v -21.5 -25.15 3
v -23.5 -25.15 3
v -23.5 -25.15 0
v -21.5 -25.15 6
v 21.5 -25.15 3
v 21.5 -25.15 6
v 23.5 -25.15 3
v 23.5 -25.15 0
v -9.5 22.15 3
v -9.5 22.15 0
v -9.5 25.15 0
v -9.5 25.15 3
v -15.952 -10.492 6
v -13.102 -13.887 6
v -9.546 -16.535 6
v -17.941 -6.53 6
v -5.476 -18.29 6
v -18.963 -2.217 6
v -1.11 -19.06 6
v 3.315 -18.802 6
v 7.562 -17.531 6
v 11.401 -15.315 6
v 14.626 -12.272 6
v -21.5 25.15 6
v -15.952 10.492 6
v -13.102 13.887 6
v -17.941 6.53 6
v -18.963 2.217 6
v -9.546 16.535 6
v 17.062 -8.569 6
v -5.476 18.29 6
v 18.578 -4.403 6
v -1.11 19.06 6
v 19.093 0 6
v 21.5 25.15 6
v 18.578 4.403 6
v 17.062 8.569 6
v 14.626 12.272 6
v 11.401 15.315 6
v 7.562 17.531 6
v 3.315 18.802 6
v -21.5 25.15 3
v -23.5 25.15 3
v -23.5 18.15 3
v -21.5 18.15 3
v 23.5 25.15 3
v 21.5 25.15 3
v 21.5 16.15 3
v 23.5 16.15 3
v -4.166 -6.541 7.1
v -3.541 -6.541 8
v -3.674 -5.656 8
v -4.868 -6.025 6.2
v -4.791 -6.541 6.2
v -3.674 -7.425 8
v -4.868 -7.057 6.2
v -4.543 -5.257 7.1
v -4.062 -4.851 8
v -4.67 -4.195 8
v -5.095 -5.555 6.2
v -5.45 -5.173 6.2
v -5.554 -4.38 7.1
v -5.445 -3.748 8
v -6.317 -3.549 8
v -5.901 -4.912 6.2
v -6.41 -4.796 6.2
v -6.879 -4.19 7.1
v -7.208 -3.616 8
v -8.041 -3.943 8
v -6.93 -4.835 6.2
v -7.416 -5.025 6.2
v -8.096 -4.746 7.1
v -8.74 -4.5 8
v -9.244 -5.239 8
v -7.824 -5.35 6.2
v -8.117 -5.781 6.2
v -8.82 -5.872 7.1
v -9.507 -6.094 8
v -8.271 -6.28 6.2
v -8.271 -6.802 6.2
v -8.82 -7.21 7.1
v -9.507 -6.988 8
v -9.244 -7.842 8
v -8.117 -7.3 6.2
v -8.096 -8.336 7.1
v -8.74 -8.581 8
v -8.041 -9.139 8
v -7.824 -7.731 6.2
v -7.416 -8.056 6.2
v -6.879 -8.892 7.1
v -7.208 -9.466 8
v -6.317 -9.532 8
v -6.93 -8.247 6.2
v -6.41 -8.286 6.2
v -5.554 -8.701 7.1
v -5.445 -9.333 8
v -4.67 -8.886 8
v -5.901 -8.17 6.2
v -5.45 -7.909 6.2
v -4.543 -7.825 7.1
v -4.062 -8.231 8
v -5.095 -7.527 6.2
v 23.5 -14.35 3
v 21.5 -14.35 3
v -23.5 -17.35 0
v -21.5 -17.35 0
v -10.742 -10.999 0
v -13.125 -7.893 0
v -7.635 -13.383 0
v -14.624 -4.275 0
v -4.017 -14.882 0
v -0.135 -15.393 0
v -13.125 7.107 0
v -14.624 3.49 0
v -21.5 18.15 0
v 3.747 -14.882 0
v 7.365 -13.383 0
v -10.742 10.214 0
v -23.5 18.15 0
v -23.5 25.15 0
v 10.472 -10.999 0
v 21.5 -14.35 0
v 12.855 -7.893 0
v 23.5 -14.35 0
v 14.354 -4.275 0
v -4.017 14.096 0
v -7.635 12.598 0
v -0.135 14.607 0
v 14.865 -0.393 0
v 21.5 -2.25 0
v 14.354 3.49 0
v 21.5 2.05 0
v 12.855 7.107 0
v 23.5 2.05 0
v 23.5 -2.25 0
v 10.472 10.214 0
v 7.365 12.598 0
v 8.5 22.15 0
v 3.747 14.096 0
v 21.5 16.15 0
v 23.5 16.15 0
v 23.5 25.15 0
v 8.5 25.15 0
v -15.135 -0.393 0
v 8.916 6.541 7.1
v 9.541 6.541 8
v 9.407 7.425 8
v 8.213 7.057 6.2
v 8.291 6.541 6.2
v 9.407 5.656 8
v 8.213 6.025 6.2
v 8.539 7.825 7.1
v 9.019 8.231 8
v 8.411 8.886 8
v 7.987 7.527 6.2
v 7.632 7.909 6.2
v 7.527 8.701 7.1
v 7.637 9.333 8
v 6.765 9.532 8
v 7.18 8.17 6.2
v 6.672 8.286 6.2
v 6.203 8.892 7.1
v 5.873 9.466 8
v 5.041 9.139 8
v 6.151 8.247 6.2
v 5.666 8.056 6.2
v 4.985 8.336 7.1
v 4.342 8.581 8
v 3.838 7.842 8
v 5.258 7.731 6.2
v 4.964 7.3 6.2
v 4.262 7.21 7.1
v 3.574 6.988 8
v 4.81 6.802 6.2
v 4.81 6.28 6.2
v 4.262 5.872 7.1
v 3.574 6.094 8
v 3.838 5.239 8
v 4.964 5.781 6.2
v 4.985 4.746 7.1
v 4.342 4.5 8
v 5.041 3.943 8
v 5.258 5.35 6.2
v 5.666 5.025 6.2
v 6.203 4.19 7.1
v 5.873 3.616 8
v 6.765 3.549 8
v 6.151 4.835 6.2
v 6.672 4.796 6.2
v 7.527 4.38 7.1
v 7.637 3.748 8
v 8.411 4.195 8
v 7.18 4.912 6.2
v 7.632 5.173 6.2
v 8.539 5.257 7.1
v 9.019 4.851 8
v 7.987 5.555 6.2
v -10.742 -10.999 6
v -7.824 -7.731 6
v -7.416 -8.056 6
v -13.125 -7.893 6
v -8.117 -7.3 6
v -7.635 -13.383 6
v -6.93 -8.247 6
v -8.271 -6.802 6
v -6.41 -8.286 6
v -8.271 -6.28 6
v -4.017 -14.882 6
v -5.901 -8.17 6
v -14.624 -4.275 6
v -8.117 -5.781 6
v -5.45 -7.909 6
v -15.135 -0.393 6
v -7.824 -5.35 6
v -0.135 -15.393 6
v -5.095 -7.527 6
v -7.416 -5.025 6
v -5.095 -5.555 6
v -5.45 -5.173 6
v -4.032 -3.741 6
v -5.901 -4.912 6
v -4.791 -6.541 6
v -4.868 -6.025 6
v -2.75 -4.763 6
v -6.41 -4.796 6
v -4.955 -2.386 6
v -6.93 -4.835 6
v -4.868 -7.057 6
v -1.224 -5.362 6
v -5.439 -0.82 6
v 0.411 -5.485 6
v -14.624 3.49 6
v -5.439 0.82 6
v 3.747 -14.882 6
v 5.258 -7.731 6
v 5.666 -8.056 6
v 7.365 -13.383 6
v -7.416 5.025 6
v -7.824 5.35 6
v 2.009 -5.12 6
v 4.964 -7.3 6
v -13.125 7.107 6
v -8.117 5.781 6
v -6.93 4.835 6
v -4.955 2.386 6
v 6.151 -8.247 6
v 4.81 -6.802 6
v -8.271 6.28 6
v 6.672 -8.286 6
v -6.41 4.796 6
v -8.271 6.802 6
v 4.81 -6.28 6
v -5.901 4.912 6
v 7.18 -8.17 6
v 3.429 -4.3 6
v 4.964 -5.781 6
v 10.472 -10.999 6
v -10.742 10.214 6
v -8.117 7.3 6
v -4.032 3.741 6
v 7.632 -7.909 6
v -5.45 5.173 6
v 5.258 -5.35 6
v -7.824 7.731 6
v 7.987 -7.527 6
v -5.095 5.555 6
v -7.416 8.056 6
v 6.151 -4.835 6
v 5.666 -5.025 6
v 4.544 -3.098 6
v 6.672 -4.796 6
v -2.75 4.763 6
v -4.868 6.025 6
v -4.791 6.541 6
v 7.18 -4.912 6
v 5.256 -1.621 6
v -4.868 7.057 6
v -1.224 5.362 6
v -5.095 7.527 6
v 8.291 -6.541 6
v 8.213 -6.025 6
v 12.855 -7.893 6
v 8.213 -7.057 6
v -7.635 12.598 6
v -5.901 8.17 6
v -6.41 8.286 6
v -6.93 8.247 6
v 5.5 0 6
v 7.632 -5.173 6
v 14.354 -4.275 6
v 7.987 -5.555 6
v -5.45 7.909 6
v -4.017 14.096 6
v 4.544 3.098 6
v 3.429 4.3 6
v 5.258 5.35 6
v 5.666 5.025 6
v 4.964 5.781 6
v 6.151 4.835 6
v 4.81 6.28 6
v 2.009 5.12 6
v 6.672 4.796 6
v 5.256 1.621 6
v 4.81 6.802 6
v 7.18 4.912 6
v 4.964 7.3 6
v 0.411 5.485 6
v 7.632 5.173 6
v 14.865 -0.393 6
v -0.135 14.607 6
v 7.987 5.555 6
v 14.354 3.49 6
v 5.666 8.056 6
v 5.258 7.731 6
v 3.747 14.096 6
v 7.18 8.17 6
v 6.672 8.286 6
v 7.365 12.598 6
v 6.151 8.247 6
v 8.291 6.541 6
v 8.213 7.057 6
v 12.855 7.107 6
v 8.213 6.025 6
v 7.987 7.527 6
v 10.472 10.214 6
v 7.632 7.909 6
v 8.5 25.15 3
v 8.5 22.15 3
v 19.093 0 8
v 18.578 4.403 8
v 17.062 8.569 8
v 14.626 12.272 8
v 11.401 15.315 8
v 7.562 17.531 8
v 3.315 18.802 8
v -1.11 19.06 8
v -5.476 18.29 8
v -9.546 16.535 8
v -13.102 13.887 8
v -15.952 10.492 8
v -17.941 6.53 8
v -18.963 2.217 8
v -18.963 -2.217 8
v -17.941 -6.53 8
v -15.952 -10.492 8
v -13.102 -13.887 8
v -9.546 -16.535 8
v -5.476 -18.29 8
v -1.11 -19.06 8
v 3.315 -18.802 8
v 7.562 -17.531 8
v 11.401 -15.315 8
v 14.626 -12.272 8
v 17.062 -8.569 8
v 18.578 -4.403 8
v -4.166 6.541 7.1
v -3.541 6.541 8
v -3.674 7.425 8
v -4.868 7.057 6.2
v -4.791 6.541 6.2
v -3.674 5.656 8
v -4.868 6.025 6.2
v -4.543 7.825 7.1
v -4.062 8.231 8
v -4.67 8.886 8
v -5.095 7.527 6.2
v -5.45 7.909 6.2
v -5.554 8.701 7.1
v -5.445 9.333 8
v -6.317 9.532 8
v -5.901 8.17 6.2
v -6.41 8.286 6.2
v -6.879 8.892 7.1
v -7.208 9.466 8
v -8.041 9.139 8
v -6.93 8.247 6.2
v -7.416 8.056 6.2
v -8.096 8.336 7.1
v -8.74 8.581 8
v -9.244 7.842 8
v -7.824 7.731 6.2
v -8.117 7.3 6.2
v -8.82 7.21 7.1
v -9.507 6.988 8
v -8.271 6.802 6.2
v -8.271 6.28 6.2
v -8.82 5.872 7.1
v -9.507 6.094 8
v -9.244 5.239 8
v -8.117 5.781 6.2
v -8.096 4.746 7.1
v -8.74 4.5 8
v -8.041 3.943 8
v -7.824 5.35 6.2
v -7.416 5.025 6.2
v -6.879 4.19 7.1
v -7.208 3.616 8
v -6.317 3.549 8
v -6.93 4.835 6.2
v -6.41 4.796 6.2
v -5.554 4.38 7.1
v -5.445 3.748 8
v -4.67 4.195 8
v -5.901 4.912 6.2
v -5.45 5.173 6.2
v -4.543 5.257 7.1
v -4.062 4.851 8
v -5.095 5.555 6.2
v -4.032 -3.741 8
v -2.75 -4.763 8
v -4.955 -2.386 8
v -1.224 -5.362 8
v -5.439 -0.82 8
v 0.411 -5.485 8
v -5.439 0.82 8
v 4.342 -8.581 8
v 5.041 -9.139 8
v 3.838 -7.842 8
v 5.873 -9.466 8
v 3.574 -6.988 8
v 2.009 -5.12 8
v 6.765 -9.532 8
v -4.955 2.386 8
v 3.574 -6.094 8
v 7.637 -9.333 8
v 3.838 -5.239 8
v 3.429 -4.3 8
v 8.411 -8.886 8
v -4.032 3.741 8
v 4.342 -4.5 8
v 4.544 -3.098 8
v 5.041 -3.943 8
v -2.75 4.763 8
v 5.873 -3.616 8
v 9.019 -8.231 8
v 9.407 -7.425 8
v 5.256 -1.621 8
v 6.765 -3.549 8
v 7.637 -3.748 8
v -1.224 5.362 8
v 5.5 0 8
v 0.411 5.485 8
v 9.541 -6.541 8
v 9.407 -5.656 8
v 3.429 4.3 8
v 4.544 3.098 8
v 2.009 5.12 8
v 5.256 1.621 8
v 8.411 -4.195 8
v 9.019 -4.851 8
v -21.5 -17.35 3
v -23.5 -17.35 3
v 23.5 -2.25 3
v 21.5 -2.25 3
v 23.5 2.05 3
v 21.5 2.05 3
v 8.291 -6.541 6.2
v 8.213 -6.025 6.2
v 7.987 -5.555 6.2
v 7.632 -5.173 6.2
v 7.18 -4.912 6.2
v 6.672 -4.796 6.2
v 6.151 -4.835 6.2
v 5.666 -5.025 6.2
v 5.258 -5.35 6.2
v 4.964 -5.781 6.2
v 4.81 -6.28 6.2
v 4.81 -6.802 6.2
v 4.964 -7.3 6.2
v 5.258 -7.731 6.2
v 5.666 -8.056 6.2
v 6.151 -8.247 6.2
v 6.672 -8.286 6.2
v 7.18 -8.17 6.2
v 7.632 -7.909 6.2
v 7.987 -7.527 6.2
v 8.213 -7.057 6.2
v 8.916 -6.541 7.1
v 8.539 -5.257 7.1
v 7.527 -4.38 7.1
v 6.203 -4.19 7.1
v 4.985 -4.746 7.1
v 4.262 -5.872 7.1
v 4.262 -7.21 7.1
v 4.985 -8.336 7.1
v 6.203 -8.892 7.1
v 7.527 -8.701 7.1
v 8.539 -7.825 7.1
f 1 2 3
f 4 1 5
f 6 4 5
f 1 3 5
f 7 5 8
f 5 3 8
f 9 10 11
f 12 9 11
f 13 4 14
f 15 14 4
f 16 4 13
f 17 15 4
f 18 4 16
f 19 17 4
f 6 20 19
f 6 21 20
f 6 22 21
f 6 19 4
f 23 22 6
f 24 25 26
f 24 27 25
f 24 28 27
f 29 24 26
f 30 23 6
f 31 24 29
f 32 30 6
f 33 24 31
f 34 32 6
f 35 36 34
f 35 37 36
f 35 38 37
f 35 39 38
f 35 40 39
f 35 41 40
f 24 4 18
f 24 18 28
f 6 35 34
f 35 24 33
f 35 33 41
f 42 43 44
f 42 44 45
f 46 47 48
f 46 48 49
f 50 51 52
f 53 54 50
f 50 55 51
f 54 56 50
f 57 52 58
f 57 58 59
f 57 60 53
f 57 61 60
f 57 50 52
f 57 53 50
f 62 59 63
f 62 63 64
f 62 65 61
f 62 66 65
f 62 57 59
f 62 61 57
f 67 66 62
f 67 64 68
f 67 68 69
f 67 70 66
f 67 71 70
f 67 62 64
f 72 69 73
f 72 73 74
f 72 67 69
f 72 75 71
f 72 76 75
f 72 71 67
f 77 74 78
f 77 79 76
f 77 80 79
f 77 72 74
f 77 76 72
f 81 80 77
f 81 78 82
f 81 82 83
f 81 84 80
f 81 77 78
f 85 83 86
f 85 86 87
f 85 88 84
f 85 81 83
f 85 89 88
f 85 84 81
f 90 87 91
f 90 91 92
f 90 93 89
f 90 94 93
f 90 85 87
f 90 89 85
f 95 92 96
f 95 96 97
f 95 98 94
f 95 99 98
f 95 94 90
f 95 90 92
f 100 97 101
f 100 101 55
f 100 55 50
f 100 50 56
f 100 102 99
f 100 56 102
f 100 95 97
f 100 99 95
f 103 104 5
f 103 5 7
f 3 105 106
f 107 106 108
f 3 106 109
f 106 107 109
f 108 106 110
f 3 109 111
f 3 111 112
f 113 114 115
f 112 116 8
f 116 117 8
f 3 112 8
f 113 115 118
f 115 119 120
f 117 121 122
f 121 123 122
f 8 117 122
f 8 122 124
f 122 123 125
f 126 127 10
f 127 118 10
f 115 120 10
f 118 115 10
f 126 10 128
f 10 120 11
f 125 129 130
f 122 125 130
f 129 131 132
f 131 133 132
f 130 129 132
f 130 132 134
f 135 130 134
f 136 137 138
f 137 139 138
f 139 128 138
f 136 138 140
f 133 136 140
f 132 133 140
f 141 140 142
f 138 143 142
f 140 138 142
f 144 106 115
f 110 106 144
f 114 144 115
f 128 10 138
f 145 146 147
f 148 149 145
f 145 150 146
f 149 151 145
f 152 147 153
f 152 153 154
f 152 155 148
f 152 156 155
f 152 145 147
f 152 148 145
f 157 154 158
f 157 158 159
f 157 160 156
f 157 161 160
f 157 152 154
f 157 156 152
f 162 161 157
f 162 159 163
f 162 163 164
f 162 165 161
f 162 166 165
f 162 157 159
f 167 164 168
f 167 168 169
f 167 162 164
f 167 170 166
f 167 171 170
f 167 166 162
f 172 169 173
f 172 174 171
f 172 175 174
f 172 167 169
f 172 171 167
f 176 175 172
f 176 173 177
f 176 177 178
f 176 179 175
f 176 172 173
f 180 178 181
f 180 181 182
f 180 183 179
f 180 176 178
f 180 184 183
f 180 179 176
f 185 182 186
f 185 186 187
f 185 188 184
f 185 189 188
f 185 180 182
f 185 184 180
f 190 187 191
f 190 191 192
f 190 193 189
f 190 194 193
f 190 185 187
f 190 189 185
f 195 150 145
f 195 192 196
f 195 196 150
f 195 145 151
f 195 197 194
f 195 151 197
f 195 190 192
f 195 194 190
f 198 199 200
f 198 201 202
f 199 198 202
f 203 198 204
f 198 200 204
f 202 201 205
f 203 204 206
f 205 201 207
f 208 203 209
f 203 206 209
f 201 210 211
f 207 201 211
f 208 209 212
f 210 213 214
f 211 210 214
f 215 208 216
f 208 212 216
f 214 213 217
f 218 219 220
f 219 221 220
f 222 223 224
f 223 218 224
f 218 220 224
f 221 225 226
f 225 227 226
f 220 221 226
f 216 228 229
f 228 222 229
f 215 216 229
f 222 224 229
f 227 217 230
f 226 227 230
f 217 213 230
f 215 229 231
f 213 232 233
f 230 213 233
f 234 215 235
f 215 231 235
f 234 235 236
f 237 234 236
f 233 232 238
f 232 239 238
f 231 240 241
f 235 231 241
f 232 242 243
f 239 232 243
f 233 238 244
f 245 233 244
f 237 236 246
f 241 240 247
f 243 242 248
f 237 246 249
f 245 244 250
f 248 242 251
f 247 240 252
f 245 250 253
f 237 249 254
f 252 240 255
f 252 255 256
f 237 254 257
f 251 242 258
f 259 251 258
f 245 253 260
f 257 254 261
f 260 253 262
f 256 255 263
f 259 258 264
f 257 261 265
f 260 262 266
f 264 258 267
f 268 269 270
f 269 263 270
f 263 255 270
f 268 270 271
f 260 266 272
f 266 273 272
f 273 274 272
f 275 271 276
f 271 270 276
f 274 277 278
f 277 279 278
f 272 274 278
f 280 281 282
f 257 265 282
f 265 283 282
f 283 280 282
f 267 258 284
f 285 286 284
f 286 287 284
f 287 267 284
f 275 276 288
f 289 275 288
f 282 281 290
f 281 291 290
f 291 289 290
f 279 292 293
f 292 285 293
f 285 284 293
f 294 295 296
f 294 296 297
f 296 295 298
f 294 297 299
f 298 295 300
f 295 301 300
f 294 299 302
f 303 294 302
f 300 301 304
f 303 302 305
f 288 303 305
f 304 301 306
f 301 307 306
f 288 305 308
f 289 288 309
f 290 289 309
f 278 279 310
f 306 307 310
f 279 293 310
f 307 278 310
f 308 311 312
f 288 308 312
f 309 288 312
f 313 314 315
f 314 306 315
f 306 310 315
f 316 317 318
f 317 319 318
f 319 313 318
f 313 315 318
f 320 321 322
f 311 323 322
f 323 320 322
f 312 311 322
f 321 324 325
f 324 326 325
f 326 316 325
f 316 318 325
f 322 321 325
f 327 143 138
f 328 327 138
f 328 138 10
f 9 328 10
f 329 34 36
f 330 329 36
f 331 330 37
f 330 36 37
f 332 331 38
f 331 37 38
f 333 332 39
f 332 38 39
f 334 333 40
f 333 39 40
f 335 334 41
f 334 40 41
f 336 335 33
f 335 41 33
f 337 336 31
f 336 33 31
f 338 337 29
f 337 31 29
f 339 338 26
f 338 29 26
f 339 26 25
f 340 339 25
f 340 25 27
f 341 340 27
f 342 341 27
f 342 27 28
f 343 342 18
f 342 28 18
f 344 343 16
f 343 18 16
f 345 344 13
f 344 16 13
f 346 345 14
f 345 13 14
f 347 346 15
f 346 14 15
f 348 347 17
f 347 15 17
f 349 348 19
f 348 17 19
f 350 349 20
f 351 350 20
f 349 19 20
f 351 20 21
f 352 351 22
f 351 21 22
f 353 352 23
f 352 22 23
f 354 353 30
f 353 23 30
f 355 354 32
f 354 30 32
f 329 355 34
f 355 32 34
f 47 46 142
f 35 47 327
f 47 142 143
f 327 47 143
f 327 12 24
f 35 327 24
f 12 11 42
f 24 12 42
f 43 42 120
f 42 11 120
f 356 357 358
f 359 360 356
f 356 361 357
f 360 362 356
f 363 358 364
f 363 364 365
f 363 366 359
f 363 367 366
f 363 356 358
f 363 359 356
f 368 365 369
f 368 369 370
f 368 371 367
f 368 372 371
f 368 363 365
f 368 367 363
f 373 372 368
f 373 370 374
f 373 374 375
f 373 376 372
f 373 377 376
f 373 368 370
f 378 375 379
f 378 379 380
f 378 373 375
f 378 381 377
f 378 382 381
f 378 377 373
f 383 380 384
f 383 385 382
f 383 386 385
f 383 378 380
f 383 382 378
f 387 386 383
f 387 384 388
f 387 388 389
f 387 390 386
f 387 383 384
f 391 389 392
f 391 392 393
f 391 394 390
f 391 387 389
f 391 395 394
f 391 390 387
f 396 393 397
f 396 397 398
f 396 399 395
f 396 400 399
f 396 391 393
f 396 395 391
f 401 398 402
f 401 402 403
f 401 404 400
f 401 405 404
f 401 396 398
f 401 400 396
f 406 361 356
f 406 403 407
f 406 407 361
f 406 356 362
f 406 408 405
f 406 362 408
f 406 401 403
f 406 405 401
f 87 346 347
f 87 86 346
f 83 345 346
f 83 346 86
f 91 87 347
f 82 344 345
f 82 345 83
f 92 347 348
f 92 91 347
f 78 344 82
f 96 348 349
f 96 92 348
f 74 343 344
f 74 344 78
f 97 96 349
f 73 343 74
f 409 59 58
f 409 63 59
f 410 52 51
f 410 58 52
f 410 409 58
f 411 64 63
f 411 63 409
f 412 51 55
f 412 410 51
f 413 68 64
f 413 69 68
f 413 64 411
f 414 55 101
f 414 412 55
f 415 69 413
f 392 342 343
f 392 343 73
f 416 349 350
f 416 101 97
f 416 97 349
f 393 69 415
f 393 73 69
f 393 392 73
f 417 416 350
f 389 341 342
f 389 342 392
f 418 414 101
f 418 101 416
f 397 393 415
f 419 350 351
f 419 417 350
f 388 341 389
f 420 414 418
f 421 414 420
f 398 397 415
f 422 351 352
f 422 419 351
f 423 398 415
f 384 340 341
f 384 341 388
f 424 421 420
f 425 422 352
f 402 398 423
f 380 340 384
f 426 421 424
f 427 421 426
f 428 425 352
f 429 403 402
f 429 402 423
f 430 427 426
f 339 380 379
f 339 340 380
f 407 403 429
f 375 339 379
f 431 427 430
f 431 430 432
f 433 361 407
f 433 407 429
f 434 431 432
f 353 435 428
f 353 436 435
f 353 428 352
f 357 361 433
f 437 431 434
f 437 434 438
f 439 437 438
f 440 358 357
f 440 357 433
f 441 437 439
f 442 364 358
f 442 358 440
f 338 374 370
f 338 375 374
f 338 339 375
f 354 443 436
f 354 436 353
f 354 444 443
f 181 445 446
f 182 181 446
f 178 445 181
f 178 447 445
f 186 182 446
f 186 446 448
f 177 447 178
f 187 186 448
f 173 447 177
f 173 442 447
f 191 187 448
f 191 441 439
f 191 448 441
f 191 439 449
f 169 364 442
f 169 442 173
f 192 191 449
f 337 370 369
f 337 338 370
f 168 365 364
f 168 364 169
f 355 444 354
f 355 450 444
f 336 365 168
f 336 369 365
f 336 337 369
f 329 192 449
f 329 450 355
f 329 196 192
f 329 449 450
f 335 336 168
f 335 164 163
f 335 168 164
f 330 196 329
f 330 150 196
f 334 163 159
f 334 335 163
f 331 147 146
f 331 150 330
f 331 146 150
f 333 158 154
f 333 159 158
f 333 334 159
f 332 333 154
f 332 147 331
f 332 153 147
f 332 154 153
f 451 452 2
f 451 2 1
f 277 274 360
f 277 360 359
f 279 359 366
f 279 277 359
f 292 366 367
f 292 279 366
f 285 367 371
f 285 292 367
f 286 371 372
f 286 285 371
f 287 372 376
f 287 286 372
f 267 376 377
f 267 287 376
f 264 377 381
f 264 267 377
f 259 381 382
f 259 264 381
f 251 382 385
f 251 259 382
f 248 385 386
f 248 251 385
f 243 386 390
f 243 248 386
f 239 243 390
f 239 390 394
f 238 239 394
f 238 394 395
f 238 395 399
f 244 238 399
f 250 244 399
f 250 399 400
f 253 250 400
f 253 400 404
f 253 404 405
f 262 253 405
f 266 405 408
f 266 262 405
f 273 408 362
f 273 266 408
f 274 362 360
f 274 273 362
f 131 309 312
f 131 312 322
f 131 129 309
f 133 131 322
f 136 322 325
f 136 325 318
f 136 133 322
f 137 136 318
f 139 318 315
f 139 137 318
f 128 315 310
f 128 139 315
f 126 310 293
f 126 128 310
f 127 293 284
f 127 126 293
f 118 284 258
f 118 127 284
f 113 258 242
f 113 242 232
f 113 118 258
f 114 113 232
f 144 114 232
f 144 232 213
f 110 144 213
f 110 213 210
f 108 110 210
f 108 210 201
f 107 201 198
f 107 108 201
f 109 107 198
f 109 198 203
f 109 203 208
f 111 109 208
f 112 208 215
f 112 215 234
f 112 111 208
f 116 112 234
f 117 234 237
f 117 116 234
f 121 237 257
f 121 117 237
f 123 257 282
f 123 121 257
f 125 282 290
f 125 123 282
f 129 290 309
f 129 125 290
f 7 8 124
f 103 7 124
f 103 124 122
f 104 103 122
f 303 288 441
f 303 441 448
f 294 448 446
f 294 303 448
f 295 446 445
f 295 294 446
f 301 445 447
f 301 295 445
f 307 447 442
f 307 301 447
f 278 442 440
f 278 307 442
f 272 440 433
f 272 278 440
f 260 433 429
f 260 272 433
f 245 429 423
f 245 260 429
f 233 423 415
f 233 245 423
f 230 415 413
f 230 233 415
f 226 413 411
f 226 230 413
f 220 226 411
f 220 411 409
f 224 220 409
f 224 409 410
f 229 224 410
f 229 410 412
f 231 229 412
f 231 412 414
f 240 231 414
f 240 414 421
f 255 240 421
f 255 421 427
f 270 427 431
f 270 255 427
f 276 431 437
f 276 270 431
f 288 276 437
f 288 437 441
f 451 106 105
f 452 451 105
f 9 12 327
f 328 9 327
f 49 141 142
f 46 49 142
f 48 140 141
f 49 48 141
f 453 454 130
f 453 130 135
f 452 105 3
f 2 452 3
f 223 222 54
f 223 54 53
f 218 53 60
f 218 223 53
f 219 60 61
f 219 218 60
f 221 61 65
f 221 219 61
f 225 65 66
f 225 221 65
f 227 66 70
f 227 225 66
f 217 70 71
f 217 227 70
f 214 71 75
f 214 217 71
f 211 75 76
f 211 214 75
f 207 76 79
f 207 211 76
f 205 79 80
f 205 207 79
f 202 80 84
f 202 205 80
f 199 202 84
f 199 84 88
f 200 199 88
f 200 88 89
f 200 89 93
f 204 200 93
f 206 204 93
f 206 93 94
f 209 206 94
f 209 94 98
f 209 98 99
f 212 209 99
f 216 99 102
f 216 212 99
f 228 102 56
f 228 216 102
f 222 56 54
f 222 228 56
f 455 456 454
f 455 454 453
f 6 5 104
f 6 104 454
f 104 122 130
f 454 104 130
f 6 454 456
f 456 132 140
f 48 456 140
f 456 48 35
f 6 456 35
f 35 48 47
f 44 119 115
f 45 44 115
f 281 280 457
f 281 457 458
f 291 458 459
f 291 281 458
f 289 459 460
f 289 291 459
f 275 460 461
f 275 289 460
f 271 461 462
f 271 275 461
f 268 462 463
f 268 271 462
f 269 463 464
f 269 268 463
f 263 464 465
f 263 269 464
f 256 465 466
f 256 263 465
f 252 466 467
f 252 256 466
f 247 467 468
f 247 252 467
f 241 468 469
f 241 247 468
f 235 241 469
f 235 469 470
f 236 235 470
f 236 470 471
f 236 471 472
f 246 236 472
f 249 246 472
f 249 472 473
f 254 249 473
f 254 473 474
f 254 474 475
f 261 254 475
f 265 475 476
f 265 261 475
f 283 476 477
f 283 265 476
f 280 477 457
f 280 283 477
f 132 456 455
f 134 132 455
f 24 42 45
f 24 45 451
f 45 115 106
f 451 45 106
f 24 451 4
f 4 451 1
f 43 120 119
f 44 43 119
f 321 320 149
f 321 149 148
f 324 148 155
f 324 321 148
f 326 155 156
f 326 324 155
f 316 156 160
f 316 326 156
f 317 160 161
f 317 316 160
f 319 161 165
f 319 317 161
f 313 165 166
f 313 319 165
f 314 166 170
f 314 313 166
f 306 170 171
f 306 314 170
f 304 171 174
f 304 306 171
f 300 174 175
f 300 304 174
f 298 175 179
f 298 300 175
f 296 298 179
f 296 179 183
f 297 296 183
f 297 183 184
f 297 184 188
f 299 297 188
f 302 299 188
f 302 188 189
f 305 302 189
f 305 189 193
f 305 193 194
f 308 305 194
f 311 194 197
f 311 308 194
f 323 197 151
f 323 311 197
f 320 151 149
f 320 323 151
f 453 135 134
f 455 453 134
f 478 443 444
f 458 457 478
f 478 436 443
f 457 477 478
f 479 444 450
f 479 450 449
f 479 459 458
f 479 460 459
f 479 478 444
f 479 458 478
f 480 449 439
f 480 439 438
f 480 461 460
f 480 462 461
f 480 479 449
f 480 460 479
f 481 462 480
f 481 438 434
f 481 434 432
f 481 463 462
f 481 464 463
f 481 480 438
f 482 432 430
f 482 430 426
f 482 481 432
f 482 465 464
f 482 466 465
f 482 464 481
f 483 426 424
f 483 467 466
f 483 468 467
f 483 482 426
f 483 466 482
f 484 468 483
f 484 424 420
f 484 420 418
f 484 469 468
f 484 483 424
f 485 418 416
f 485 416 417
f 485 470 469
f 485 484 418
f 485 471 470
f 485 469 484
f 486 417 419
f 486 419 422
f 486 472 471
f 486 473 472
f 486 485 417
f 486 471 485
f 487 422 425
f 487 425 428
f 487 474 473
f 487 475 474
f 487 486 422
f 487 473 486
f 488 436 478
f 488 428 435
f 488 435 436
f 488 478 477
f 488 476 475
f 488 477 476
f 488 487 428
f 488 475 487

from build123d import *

# Parameters (mm, degrees)
F0_R     = 15
F1_DEPTH = 3
F2_R     = 15
F2_W     = 18
F2_H     = 3
F3_DEPTH = 3
F4_R     = 19.092503
F4_R_2   = 1.75
F4_R_3   = 5.5
F5_DEPTH = 2
F6_SIZE2 = 1.8
F6_SIZE  = 1.25
F7_W     = 2
F7_H     = 0.1
F8_DEPTH = 3.001


with BuildPart() as f1:
    # F0 (on Top) → F1 (new body)
    with BuildSketch(Plane.XY):
        Polygon((-9.5, 25.15), (-23.5, 25.15), (-23.5, 18.15), (-21.5, 18.15), (-21.5, -17.35), (-23.5, -17.35), (-23.5, -25.15), (23.5, -25.15), (23.5, -14.35), (21.5, -14.35), (21.5, -2.35), (23.5, -2.35), (23.5, 2.15), (21.5, 2.15), (21.5, 16.15), (23.5, 16.15), (23.5, 25.15), (8.5, 25.15), (8.5, 22.15), (-9.5, 22.15), align=None)
        with Locations((-0.135, -0.392646)):
            Circle(F0_R, mode=Mode.SUBTRACT)
    extrude(amount=F1_DEPTH)

    # F2 (on face) → F3 (join)
    with BuildSketch(Plane.XY.offset(3)):
        Polygon((-21.5, 25.15), (-21.5, 18.15), (-21.5, -17.35), (-21.5, -25.15), (21.5, -25.15), (21.5, -14.35), (21.5, -2.35), (21.5, 2.15), (21.5, 16.15), (21.5, 25.15), (8.5, 25.15), (8.5, 22.15), (-9.5, 22.15), (-9.5, 25.15), align=None)
        with Locations((-0.135, -0.392646)):
            Circle(F2_R, mode=Mode.SUBTRACT)
        with Locations((-0.5, 23.65)):
            Rectangle(F2_W, F2_H)
    extrude(amount=F3_DEPTH)

    # F4 (on face) → F5 (join)
    with BuildSketch(Plane.XY.offset(6)):
        Circle(F4_R)
        with Locations((-6.540738, -6.540738)):
            Circle(F4_R_2, mode=Mode.SUBTRACT)
        with Locations((6.540738, -6.540738)):
            Circle(F4_R_2, mode=Mode.SUBTRACT)
        with Locations((-6.540738, 6.540738)):
            Circle(F4_R_2, mode=Mode.SUBTRACT)
        Circle(F4_R_3, mode=Mode.SUBTRACT)
        with Locations((6.540738, 6.540738)):
            Circle(F4_R_2, mode=Mode.SUBTRACT)
    extrude(amount=F5_DEPTH)

    # F6
    f6_edges = [f1.edges().sort_by_distance(p)[0] for p in [
        (-8.290738, 6.540738, 8),
        (4.790738, 6.540738, 8),
        (4.790738, -6.540738, 8),
        (-8.290738, -6.540738, 8),
    ]]
    chamfer(f6_edges, length=F6_SIZE, length2=F6_SIZE2)

    # F7 (on face) → F8 (cut, through all)
    with BuildSketch(Plane.XY.offset(3)):
        with Locations((22.5, 2.1)):
            Rectangle(F7_W, F7_H)
        with Locations((22.5, -2.3)):
            Rectangle(F7_W, F7_H)
    extrude(amount=-F8_DEPTH, mode=Mode.SUBTRACT)


solid = f1.part
